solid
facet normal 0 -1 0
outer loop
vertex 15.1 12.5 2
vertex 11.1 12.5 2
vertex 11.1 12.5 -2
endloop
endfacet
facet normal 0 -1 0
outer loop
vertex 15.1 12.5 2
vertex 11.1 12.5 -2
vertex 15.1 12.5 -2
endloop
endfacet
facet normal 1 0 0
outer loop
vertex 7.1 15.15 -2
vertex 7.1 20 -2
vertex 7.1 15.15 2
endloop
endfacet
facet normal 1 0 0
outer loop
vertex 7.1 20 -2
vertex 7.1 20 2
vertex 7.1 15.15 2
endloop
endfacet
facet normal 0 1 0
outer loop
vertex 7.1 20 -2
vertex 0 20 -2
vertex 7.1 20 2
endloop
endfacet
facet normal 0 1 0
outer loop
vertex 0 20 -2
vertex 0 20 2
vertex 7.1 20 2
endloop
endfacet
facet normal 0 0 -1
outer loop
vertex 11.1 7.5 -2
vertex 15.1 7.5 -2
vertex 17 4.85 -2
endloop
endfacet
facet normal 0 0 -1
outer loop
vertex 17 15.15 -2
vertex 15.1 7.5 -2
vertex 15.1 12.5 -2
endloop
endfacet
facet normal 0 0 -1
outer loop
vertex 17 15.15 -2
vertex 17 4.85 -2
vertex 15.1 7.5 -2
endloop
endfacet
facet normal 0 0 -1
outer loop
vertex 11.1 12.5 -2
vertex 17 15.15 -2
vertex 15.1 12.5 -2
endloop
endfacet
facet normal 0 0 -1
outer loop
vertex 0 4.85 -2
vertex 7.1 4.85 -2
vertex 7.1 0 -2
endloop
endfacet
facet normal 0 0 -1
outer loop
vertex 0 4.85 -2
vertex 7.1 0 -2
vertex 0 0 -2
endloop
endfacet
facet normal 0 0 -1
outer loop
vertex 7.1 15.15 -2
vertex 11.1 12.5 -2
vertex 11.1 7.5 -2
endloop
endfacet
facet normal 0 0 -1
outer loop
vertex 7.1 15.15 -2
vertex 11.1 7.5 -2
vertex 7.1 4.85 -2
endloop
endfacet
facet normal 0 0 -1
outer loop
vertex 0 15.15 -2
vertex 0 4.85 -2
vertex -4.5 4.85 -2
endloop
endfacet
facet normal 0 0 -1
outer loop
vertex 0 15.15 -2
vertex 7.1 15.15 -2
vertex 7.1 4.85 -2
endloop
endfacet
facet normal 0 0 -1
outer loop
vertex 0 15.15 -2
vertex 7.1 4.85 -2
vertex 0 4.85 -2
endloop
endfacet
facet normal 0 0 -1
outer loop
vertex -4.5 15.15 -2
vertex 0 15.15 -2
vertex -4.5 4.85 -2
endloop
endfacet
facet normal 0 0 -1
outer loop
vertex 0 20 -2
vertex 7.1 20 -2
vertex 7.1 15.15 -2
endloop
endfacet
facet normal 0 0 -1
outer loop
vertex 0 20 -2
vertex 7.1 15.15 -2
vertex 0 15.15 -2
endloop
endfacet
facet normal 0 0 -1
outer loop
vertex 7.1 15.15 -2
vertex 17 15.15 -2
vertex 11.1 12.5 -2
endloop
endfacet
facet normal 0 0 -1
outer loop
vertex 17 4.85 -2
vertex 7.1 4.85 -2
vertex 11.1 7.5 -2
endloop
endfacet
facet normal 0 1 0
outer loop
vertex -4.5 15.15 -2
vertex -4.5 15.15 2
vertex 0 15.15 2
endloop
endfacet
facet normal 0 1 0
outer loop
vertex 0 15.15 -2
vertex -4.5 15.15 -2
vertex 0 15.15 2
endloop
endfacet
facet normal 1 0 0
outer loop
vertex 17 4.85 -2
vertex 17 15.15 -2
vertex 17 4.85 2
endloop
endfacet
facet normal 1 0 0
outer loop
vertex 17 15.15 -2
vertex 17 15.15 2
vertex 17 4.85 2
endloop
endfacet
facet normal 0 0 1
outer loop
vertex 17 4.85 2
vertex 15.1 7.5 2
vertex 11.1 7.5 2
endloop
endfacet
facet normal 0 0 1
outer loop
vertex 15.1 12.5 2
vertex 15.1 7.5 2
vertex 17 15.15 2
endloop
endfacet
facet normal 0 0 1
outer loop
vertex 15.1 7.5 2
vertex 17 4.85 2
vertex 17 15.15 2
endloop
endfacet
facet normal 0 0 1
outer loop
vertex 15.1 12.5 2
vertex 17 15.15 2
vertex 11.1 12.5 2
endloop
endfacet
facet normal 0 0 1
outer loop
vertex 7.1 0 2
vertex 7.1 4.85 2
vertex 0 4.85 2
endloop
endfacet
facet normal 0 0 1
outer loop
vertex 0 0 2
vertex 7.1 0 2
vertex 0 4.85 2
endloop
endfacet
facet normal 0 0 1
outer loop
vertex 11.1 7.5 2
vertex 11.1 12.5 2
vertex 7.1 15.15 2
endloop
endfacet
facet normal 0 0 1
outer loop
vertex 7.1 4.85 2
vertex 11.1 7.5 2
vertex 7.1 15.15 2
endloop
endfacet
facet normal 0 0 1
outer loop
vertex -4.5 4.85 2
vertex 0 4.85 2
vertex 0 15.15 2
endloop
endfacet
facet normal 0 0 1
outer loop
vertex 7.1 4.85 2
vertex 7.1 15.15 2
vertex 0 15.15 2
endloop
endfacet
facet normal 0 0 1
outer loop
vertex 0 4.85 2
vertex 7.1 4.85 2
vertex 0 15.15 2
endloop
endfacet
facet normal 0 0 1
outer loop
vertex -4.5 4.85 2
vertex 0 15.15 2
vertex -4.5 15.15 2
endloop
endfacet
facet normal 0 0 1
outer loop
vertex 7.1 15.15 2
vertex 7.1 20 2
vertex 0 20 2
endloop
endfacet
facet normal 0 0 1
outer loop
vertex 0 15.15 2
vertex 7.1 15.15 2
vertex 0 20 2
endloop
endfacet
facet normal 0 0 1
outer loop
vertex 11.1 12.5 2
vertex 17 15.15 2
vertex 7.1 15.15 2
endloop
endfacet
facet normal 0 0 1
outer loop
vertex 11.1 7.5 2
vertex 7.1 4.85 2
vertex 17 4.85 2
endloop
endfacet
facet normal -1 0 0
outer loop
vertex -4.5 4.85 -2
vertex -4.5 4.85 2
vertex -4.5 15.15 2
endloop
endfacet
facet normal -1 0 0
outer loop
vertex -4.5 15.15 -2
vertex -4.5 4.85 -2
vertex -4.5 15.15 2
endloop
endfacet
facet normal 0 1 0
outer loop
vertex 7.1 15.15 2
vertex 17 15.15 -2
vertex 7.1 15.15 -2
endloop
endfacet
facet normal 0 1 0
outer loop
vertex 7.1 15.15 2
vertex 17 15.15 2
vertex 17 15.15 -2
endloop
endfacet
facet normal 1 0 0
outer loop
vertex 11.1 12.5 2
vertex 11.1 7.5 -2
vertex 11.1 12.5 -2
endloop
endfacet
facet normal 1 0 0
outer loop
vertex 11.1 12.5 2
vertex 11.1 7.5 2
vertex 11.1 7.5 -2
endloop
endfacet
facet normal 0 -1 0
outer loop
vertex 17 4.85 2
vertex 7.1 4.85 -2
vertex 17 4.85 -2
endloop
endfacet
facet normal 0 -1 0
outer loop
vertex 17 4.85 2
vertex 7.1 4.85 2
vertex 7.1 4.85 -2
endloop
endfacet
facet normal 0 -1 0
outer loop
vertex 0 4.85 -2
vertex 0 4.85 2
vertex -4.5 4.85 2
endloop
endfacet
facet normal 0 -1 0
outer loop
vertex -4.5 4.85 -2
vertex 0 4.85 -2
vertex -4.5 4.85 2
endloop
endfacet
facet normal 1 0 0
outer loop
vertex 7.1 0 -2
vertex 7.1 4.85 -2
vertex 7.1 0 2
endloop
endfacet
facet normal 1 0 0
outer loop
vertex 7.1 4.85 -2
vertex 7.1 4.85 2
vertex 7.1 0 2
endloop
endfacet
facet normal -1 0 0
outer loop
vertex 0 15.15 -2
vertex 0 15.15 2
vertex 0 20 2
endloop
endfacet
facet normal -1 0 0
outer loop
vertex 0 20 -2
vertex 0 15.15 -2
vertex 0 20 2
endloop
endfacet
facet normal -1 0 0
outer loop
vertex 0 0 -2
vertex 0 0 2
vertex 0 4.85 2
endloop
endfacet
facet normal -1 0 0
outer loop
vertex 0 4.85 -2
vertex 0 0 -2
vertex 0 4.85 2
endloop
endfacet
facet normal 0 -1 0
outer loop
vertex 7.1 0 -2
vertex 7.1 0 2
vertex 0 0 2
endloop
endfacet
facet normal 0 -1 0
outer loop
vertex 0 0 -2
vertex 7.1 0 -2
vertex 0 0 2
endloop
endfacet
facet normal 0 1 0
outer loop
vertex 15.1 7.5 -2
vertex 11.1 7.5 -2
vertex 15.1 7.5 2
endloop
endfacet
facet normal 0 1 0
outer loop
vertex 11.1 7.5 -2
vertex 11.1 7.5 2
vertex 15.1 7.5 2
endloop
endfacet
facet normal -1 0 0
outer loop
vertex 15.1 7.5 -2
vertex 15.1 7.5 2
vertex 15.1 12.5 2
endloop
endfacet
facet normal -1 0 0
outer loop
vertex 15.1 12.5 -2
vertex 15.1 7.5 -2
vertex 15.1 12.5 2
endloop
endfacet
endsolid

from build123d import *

# Parameters (mm, degrees)
SKETCH_1_W      = 4
SKETCH_1_H      = 5
EXTRUDE_1_DEPTH = 2


with BuildPart() as part:
    # 草图1 → 凸台-拉伸1 (new, symmetric)
    with BuildSketch(Plane.XY):
        Polygon((0, 15.15), (0, 20), (7.1, 20), (7.1, 15.15), (12.1, 15.15), (17, 15.15), (17, 4.85), (12.1, 4.85), (7.1, 4.85), (7.1, 0), (0, 0), (0, 4.85), (-4.5, 4.85), (-4.5, 15.15), align=None)
        with Locations((13.1, 10)):
            Rectangle(SKETCH_1_W, SKETCH_1_H, mode=Mode.SUBTRACT)
    extrude(amount=EXTRUDE_1_DEPTH, both=True)


solid = part.part
